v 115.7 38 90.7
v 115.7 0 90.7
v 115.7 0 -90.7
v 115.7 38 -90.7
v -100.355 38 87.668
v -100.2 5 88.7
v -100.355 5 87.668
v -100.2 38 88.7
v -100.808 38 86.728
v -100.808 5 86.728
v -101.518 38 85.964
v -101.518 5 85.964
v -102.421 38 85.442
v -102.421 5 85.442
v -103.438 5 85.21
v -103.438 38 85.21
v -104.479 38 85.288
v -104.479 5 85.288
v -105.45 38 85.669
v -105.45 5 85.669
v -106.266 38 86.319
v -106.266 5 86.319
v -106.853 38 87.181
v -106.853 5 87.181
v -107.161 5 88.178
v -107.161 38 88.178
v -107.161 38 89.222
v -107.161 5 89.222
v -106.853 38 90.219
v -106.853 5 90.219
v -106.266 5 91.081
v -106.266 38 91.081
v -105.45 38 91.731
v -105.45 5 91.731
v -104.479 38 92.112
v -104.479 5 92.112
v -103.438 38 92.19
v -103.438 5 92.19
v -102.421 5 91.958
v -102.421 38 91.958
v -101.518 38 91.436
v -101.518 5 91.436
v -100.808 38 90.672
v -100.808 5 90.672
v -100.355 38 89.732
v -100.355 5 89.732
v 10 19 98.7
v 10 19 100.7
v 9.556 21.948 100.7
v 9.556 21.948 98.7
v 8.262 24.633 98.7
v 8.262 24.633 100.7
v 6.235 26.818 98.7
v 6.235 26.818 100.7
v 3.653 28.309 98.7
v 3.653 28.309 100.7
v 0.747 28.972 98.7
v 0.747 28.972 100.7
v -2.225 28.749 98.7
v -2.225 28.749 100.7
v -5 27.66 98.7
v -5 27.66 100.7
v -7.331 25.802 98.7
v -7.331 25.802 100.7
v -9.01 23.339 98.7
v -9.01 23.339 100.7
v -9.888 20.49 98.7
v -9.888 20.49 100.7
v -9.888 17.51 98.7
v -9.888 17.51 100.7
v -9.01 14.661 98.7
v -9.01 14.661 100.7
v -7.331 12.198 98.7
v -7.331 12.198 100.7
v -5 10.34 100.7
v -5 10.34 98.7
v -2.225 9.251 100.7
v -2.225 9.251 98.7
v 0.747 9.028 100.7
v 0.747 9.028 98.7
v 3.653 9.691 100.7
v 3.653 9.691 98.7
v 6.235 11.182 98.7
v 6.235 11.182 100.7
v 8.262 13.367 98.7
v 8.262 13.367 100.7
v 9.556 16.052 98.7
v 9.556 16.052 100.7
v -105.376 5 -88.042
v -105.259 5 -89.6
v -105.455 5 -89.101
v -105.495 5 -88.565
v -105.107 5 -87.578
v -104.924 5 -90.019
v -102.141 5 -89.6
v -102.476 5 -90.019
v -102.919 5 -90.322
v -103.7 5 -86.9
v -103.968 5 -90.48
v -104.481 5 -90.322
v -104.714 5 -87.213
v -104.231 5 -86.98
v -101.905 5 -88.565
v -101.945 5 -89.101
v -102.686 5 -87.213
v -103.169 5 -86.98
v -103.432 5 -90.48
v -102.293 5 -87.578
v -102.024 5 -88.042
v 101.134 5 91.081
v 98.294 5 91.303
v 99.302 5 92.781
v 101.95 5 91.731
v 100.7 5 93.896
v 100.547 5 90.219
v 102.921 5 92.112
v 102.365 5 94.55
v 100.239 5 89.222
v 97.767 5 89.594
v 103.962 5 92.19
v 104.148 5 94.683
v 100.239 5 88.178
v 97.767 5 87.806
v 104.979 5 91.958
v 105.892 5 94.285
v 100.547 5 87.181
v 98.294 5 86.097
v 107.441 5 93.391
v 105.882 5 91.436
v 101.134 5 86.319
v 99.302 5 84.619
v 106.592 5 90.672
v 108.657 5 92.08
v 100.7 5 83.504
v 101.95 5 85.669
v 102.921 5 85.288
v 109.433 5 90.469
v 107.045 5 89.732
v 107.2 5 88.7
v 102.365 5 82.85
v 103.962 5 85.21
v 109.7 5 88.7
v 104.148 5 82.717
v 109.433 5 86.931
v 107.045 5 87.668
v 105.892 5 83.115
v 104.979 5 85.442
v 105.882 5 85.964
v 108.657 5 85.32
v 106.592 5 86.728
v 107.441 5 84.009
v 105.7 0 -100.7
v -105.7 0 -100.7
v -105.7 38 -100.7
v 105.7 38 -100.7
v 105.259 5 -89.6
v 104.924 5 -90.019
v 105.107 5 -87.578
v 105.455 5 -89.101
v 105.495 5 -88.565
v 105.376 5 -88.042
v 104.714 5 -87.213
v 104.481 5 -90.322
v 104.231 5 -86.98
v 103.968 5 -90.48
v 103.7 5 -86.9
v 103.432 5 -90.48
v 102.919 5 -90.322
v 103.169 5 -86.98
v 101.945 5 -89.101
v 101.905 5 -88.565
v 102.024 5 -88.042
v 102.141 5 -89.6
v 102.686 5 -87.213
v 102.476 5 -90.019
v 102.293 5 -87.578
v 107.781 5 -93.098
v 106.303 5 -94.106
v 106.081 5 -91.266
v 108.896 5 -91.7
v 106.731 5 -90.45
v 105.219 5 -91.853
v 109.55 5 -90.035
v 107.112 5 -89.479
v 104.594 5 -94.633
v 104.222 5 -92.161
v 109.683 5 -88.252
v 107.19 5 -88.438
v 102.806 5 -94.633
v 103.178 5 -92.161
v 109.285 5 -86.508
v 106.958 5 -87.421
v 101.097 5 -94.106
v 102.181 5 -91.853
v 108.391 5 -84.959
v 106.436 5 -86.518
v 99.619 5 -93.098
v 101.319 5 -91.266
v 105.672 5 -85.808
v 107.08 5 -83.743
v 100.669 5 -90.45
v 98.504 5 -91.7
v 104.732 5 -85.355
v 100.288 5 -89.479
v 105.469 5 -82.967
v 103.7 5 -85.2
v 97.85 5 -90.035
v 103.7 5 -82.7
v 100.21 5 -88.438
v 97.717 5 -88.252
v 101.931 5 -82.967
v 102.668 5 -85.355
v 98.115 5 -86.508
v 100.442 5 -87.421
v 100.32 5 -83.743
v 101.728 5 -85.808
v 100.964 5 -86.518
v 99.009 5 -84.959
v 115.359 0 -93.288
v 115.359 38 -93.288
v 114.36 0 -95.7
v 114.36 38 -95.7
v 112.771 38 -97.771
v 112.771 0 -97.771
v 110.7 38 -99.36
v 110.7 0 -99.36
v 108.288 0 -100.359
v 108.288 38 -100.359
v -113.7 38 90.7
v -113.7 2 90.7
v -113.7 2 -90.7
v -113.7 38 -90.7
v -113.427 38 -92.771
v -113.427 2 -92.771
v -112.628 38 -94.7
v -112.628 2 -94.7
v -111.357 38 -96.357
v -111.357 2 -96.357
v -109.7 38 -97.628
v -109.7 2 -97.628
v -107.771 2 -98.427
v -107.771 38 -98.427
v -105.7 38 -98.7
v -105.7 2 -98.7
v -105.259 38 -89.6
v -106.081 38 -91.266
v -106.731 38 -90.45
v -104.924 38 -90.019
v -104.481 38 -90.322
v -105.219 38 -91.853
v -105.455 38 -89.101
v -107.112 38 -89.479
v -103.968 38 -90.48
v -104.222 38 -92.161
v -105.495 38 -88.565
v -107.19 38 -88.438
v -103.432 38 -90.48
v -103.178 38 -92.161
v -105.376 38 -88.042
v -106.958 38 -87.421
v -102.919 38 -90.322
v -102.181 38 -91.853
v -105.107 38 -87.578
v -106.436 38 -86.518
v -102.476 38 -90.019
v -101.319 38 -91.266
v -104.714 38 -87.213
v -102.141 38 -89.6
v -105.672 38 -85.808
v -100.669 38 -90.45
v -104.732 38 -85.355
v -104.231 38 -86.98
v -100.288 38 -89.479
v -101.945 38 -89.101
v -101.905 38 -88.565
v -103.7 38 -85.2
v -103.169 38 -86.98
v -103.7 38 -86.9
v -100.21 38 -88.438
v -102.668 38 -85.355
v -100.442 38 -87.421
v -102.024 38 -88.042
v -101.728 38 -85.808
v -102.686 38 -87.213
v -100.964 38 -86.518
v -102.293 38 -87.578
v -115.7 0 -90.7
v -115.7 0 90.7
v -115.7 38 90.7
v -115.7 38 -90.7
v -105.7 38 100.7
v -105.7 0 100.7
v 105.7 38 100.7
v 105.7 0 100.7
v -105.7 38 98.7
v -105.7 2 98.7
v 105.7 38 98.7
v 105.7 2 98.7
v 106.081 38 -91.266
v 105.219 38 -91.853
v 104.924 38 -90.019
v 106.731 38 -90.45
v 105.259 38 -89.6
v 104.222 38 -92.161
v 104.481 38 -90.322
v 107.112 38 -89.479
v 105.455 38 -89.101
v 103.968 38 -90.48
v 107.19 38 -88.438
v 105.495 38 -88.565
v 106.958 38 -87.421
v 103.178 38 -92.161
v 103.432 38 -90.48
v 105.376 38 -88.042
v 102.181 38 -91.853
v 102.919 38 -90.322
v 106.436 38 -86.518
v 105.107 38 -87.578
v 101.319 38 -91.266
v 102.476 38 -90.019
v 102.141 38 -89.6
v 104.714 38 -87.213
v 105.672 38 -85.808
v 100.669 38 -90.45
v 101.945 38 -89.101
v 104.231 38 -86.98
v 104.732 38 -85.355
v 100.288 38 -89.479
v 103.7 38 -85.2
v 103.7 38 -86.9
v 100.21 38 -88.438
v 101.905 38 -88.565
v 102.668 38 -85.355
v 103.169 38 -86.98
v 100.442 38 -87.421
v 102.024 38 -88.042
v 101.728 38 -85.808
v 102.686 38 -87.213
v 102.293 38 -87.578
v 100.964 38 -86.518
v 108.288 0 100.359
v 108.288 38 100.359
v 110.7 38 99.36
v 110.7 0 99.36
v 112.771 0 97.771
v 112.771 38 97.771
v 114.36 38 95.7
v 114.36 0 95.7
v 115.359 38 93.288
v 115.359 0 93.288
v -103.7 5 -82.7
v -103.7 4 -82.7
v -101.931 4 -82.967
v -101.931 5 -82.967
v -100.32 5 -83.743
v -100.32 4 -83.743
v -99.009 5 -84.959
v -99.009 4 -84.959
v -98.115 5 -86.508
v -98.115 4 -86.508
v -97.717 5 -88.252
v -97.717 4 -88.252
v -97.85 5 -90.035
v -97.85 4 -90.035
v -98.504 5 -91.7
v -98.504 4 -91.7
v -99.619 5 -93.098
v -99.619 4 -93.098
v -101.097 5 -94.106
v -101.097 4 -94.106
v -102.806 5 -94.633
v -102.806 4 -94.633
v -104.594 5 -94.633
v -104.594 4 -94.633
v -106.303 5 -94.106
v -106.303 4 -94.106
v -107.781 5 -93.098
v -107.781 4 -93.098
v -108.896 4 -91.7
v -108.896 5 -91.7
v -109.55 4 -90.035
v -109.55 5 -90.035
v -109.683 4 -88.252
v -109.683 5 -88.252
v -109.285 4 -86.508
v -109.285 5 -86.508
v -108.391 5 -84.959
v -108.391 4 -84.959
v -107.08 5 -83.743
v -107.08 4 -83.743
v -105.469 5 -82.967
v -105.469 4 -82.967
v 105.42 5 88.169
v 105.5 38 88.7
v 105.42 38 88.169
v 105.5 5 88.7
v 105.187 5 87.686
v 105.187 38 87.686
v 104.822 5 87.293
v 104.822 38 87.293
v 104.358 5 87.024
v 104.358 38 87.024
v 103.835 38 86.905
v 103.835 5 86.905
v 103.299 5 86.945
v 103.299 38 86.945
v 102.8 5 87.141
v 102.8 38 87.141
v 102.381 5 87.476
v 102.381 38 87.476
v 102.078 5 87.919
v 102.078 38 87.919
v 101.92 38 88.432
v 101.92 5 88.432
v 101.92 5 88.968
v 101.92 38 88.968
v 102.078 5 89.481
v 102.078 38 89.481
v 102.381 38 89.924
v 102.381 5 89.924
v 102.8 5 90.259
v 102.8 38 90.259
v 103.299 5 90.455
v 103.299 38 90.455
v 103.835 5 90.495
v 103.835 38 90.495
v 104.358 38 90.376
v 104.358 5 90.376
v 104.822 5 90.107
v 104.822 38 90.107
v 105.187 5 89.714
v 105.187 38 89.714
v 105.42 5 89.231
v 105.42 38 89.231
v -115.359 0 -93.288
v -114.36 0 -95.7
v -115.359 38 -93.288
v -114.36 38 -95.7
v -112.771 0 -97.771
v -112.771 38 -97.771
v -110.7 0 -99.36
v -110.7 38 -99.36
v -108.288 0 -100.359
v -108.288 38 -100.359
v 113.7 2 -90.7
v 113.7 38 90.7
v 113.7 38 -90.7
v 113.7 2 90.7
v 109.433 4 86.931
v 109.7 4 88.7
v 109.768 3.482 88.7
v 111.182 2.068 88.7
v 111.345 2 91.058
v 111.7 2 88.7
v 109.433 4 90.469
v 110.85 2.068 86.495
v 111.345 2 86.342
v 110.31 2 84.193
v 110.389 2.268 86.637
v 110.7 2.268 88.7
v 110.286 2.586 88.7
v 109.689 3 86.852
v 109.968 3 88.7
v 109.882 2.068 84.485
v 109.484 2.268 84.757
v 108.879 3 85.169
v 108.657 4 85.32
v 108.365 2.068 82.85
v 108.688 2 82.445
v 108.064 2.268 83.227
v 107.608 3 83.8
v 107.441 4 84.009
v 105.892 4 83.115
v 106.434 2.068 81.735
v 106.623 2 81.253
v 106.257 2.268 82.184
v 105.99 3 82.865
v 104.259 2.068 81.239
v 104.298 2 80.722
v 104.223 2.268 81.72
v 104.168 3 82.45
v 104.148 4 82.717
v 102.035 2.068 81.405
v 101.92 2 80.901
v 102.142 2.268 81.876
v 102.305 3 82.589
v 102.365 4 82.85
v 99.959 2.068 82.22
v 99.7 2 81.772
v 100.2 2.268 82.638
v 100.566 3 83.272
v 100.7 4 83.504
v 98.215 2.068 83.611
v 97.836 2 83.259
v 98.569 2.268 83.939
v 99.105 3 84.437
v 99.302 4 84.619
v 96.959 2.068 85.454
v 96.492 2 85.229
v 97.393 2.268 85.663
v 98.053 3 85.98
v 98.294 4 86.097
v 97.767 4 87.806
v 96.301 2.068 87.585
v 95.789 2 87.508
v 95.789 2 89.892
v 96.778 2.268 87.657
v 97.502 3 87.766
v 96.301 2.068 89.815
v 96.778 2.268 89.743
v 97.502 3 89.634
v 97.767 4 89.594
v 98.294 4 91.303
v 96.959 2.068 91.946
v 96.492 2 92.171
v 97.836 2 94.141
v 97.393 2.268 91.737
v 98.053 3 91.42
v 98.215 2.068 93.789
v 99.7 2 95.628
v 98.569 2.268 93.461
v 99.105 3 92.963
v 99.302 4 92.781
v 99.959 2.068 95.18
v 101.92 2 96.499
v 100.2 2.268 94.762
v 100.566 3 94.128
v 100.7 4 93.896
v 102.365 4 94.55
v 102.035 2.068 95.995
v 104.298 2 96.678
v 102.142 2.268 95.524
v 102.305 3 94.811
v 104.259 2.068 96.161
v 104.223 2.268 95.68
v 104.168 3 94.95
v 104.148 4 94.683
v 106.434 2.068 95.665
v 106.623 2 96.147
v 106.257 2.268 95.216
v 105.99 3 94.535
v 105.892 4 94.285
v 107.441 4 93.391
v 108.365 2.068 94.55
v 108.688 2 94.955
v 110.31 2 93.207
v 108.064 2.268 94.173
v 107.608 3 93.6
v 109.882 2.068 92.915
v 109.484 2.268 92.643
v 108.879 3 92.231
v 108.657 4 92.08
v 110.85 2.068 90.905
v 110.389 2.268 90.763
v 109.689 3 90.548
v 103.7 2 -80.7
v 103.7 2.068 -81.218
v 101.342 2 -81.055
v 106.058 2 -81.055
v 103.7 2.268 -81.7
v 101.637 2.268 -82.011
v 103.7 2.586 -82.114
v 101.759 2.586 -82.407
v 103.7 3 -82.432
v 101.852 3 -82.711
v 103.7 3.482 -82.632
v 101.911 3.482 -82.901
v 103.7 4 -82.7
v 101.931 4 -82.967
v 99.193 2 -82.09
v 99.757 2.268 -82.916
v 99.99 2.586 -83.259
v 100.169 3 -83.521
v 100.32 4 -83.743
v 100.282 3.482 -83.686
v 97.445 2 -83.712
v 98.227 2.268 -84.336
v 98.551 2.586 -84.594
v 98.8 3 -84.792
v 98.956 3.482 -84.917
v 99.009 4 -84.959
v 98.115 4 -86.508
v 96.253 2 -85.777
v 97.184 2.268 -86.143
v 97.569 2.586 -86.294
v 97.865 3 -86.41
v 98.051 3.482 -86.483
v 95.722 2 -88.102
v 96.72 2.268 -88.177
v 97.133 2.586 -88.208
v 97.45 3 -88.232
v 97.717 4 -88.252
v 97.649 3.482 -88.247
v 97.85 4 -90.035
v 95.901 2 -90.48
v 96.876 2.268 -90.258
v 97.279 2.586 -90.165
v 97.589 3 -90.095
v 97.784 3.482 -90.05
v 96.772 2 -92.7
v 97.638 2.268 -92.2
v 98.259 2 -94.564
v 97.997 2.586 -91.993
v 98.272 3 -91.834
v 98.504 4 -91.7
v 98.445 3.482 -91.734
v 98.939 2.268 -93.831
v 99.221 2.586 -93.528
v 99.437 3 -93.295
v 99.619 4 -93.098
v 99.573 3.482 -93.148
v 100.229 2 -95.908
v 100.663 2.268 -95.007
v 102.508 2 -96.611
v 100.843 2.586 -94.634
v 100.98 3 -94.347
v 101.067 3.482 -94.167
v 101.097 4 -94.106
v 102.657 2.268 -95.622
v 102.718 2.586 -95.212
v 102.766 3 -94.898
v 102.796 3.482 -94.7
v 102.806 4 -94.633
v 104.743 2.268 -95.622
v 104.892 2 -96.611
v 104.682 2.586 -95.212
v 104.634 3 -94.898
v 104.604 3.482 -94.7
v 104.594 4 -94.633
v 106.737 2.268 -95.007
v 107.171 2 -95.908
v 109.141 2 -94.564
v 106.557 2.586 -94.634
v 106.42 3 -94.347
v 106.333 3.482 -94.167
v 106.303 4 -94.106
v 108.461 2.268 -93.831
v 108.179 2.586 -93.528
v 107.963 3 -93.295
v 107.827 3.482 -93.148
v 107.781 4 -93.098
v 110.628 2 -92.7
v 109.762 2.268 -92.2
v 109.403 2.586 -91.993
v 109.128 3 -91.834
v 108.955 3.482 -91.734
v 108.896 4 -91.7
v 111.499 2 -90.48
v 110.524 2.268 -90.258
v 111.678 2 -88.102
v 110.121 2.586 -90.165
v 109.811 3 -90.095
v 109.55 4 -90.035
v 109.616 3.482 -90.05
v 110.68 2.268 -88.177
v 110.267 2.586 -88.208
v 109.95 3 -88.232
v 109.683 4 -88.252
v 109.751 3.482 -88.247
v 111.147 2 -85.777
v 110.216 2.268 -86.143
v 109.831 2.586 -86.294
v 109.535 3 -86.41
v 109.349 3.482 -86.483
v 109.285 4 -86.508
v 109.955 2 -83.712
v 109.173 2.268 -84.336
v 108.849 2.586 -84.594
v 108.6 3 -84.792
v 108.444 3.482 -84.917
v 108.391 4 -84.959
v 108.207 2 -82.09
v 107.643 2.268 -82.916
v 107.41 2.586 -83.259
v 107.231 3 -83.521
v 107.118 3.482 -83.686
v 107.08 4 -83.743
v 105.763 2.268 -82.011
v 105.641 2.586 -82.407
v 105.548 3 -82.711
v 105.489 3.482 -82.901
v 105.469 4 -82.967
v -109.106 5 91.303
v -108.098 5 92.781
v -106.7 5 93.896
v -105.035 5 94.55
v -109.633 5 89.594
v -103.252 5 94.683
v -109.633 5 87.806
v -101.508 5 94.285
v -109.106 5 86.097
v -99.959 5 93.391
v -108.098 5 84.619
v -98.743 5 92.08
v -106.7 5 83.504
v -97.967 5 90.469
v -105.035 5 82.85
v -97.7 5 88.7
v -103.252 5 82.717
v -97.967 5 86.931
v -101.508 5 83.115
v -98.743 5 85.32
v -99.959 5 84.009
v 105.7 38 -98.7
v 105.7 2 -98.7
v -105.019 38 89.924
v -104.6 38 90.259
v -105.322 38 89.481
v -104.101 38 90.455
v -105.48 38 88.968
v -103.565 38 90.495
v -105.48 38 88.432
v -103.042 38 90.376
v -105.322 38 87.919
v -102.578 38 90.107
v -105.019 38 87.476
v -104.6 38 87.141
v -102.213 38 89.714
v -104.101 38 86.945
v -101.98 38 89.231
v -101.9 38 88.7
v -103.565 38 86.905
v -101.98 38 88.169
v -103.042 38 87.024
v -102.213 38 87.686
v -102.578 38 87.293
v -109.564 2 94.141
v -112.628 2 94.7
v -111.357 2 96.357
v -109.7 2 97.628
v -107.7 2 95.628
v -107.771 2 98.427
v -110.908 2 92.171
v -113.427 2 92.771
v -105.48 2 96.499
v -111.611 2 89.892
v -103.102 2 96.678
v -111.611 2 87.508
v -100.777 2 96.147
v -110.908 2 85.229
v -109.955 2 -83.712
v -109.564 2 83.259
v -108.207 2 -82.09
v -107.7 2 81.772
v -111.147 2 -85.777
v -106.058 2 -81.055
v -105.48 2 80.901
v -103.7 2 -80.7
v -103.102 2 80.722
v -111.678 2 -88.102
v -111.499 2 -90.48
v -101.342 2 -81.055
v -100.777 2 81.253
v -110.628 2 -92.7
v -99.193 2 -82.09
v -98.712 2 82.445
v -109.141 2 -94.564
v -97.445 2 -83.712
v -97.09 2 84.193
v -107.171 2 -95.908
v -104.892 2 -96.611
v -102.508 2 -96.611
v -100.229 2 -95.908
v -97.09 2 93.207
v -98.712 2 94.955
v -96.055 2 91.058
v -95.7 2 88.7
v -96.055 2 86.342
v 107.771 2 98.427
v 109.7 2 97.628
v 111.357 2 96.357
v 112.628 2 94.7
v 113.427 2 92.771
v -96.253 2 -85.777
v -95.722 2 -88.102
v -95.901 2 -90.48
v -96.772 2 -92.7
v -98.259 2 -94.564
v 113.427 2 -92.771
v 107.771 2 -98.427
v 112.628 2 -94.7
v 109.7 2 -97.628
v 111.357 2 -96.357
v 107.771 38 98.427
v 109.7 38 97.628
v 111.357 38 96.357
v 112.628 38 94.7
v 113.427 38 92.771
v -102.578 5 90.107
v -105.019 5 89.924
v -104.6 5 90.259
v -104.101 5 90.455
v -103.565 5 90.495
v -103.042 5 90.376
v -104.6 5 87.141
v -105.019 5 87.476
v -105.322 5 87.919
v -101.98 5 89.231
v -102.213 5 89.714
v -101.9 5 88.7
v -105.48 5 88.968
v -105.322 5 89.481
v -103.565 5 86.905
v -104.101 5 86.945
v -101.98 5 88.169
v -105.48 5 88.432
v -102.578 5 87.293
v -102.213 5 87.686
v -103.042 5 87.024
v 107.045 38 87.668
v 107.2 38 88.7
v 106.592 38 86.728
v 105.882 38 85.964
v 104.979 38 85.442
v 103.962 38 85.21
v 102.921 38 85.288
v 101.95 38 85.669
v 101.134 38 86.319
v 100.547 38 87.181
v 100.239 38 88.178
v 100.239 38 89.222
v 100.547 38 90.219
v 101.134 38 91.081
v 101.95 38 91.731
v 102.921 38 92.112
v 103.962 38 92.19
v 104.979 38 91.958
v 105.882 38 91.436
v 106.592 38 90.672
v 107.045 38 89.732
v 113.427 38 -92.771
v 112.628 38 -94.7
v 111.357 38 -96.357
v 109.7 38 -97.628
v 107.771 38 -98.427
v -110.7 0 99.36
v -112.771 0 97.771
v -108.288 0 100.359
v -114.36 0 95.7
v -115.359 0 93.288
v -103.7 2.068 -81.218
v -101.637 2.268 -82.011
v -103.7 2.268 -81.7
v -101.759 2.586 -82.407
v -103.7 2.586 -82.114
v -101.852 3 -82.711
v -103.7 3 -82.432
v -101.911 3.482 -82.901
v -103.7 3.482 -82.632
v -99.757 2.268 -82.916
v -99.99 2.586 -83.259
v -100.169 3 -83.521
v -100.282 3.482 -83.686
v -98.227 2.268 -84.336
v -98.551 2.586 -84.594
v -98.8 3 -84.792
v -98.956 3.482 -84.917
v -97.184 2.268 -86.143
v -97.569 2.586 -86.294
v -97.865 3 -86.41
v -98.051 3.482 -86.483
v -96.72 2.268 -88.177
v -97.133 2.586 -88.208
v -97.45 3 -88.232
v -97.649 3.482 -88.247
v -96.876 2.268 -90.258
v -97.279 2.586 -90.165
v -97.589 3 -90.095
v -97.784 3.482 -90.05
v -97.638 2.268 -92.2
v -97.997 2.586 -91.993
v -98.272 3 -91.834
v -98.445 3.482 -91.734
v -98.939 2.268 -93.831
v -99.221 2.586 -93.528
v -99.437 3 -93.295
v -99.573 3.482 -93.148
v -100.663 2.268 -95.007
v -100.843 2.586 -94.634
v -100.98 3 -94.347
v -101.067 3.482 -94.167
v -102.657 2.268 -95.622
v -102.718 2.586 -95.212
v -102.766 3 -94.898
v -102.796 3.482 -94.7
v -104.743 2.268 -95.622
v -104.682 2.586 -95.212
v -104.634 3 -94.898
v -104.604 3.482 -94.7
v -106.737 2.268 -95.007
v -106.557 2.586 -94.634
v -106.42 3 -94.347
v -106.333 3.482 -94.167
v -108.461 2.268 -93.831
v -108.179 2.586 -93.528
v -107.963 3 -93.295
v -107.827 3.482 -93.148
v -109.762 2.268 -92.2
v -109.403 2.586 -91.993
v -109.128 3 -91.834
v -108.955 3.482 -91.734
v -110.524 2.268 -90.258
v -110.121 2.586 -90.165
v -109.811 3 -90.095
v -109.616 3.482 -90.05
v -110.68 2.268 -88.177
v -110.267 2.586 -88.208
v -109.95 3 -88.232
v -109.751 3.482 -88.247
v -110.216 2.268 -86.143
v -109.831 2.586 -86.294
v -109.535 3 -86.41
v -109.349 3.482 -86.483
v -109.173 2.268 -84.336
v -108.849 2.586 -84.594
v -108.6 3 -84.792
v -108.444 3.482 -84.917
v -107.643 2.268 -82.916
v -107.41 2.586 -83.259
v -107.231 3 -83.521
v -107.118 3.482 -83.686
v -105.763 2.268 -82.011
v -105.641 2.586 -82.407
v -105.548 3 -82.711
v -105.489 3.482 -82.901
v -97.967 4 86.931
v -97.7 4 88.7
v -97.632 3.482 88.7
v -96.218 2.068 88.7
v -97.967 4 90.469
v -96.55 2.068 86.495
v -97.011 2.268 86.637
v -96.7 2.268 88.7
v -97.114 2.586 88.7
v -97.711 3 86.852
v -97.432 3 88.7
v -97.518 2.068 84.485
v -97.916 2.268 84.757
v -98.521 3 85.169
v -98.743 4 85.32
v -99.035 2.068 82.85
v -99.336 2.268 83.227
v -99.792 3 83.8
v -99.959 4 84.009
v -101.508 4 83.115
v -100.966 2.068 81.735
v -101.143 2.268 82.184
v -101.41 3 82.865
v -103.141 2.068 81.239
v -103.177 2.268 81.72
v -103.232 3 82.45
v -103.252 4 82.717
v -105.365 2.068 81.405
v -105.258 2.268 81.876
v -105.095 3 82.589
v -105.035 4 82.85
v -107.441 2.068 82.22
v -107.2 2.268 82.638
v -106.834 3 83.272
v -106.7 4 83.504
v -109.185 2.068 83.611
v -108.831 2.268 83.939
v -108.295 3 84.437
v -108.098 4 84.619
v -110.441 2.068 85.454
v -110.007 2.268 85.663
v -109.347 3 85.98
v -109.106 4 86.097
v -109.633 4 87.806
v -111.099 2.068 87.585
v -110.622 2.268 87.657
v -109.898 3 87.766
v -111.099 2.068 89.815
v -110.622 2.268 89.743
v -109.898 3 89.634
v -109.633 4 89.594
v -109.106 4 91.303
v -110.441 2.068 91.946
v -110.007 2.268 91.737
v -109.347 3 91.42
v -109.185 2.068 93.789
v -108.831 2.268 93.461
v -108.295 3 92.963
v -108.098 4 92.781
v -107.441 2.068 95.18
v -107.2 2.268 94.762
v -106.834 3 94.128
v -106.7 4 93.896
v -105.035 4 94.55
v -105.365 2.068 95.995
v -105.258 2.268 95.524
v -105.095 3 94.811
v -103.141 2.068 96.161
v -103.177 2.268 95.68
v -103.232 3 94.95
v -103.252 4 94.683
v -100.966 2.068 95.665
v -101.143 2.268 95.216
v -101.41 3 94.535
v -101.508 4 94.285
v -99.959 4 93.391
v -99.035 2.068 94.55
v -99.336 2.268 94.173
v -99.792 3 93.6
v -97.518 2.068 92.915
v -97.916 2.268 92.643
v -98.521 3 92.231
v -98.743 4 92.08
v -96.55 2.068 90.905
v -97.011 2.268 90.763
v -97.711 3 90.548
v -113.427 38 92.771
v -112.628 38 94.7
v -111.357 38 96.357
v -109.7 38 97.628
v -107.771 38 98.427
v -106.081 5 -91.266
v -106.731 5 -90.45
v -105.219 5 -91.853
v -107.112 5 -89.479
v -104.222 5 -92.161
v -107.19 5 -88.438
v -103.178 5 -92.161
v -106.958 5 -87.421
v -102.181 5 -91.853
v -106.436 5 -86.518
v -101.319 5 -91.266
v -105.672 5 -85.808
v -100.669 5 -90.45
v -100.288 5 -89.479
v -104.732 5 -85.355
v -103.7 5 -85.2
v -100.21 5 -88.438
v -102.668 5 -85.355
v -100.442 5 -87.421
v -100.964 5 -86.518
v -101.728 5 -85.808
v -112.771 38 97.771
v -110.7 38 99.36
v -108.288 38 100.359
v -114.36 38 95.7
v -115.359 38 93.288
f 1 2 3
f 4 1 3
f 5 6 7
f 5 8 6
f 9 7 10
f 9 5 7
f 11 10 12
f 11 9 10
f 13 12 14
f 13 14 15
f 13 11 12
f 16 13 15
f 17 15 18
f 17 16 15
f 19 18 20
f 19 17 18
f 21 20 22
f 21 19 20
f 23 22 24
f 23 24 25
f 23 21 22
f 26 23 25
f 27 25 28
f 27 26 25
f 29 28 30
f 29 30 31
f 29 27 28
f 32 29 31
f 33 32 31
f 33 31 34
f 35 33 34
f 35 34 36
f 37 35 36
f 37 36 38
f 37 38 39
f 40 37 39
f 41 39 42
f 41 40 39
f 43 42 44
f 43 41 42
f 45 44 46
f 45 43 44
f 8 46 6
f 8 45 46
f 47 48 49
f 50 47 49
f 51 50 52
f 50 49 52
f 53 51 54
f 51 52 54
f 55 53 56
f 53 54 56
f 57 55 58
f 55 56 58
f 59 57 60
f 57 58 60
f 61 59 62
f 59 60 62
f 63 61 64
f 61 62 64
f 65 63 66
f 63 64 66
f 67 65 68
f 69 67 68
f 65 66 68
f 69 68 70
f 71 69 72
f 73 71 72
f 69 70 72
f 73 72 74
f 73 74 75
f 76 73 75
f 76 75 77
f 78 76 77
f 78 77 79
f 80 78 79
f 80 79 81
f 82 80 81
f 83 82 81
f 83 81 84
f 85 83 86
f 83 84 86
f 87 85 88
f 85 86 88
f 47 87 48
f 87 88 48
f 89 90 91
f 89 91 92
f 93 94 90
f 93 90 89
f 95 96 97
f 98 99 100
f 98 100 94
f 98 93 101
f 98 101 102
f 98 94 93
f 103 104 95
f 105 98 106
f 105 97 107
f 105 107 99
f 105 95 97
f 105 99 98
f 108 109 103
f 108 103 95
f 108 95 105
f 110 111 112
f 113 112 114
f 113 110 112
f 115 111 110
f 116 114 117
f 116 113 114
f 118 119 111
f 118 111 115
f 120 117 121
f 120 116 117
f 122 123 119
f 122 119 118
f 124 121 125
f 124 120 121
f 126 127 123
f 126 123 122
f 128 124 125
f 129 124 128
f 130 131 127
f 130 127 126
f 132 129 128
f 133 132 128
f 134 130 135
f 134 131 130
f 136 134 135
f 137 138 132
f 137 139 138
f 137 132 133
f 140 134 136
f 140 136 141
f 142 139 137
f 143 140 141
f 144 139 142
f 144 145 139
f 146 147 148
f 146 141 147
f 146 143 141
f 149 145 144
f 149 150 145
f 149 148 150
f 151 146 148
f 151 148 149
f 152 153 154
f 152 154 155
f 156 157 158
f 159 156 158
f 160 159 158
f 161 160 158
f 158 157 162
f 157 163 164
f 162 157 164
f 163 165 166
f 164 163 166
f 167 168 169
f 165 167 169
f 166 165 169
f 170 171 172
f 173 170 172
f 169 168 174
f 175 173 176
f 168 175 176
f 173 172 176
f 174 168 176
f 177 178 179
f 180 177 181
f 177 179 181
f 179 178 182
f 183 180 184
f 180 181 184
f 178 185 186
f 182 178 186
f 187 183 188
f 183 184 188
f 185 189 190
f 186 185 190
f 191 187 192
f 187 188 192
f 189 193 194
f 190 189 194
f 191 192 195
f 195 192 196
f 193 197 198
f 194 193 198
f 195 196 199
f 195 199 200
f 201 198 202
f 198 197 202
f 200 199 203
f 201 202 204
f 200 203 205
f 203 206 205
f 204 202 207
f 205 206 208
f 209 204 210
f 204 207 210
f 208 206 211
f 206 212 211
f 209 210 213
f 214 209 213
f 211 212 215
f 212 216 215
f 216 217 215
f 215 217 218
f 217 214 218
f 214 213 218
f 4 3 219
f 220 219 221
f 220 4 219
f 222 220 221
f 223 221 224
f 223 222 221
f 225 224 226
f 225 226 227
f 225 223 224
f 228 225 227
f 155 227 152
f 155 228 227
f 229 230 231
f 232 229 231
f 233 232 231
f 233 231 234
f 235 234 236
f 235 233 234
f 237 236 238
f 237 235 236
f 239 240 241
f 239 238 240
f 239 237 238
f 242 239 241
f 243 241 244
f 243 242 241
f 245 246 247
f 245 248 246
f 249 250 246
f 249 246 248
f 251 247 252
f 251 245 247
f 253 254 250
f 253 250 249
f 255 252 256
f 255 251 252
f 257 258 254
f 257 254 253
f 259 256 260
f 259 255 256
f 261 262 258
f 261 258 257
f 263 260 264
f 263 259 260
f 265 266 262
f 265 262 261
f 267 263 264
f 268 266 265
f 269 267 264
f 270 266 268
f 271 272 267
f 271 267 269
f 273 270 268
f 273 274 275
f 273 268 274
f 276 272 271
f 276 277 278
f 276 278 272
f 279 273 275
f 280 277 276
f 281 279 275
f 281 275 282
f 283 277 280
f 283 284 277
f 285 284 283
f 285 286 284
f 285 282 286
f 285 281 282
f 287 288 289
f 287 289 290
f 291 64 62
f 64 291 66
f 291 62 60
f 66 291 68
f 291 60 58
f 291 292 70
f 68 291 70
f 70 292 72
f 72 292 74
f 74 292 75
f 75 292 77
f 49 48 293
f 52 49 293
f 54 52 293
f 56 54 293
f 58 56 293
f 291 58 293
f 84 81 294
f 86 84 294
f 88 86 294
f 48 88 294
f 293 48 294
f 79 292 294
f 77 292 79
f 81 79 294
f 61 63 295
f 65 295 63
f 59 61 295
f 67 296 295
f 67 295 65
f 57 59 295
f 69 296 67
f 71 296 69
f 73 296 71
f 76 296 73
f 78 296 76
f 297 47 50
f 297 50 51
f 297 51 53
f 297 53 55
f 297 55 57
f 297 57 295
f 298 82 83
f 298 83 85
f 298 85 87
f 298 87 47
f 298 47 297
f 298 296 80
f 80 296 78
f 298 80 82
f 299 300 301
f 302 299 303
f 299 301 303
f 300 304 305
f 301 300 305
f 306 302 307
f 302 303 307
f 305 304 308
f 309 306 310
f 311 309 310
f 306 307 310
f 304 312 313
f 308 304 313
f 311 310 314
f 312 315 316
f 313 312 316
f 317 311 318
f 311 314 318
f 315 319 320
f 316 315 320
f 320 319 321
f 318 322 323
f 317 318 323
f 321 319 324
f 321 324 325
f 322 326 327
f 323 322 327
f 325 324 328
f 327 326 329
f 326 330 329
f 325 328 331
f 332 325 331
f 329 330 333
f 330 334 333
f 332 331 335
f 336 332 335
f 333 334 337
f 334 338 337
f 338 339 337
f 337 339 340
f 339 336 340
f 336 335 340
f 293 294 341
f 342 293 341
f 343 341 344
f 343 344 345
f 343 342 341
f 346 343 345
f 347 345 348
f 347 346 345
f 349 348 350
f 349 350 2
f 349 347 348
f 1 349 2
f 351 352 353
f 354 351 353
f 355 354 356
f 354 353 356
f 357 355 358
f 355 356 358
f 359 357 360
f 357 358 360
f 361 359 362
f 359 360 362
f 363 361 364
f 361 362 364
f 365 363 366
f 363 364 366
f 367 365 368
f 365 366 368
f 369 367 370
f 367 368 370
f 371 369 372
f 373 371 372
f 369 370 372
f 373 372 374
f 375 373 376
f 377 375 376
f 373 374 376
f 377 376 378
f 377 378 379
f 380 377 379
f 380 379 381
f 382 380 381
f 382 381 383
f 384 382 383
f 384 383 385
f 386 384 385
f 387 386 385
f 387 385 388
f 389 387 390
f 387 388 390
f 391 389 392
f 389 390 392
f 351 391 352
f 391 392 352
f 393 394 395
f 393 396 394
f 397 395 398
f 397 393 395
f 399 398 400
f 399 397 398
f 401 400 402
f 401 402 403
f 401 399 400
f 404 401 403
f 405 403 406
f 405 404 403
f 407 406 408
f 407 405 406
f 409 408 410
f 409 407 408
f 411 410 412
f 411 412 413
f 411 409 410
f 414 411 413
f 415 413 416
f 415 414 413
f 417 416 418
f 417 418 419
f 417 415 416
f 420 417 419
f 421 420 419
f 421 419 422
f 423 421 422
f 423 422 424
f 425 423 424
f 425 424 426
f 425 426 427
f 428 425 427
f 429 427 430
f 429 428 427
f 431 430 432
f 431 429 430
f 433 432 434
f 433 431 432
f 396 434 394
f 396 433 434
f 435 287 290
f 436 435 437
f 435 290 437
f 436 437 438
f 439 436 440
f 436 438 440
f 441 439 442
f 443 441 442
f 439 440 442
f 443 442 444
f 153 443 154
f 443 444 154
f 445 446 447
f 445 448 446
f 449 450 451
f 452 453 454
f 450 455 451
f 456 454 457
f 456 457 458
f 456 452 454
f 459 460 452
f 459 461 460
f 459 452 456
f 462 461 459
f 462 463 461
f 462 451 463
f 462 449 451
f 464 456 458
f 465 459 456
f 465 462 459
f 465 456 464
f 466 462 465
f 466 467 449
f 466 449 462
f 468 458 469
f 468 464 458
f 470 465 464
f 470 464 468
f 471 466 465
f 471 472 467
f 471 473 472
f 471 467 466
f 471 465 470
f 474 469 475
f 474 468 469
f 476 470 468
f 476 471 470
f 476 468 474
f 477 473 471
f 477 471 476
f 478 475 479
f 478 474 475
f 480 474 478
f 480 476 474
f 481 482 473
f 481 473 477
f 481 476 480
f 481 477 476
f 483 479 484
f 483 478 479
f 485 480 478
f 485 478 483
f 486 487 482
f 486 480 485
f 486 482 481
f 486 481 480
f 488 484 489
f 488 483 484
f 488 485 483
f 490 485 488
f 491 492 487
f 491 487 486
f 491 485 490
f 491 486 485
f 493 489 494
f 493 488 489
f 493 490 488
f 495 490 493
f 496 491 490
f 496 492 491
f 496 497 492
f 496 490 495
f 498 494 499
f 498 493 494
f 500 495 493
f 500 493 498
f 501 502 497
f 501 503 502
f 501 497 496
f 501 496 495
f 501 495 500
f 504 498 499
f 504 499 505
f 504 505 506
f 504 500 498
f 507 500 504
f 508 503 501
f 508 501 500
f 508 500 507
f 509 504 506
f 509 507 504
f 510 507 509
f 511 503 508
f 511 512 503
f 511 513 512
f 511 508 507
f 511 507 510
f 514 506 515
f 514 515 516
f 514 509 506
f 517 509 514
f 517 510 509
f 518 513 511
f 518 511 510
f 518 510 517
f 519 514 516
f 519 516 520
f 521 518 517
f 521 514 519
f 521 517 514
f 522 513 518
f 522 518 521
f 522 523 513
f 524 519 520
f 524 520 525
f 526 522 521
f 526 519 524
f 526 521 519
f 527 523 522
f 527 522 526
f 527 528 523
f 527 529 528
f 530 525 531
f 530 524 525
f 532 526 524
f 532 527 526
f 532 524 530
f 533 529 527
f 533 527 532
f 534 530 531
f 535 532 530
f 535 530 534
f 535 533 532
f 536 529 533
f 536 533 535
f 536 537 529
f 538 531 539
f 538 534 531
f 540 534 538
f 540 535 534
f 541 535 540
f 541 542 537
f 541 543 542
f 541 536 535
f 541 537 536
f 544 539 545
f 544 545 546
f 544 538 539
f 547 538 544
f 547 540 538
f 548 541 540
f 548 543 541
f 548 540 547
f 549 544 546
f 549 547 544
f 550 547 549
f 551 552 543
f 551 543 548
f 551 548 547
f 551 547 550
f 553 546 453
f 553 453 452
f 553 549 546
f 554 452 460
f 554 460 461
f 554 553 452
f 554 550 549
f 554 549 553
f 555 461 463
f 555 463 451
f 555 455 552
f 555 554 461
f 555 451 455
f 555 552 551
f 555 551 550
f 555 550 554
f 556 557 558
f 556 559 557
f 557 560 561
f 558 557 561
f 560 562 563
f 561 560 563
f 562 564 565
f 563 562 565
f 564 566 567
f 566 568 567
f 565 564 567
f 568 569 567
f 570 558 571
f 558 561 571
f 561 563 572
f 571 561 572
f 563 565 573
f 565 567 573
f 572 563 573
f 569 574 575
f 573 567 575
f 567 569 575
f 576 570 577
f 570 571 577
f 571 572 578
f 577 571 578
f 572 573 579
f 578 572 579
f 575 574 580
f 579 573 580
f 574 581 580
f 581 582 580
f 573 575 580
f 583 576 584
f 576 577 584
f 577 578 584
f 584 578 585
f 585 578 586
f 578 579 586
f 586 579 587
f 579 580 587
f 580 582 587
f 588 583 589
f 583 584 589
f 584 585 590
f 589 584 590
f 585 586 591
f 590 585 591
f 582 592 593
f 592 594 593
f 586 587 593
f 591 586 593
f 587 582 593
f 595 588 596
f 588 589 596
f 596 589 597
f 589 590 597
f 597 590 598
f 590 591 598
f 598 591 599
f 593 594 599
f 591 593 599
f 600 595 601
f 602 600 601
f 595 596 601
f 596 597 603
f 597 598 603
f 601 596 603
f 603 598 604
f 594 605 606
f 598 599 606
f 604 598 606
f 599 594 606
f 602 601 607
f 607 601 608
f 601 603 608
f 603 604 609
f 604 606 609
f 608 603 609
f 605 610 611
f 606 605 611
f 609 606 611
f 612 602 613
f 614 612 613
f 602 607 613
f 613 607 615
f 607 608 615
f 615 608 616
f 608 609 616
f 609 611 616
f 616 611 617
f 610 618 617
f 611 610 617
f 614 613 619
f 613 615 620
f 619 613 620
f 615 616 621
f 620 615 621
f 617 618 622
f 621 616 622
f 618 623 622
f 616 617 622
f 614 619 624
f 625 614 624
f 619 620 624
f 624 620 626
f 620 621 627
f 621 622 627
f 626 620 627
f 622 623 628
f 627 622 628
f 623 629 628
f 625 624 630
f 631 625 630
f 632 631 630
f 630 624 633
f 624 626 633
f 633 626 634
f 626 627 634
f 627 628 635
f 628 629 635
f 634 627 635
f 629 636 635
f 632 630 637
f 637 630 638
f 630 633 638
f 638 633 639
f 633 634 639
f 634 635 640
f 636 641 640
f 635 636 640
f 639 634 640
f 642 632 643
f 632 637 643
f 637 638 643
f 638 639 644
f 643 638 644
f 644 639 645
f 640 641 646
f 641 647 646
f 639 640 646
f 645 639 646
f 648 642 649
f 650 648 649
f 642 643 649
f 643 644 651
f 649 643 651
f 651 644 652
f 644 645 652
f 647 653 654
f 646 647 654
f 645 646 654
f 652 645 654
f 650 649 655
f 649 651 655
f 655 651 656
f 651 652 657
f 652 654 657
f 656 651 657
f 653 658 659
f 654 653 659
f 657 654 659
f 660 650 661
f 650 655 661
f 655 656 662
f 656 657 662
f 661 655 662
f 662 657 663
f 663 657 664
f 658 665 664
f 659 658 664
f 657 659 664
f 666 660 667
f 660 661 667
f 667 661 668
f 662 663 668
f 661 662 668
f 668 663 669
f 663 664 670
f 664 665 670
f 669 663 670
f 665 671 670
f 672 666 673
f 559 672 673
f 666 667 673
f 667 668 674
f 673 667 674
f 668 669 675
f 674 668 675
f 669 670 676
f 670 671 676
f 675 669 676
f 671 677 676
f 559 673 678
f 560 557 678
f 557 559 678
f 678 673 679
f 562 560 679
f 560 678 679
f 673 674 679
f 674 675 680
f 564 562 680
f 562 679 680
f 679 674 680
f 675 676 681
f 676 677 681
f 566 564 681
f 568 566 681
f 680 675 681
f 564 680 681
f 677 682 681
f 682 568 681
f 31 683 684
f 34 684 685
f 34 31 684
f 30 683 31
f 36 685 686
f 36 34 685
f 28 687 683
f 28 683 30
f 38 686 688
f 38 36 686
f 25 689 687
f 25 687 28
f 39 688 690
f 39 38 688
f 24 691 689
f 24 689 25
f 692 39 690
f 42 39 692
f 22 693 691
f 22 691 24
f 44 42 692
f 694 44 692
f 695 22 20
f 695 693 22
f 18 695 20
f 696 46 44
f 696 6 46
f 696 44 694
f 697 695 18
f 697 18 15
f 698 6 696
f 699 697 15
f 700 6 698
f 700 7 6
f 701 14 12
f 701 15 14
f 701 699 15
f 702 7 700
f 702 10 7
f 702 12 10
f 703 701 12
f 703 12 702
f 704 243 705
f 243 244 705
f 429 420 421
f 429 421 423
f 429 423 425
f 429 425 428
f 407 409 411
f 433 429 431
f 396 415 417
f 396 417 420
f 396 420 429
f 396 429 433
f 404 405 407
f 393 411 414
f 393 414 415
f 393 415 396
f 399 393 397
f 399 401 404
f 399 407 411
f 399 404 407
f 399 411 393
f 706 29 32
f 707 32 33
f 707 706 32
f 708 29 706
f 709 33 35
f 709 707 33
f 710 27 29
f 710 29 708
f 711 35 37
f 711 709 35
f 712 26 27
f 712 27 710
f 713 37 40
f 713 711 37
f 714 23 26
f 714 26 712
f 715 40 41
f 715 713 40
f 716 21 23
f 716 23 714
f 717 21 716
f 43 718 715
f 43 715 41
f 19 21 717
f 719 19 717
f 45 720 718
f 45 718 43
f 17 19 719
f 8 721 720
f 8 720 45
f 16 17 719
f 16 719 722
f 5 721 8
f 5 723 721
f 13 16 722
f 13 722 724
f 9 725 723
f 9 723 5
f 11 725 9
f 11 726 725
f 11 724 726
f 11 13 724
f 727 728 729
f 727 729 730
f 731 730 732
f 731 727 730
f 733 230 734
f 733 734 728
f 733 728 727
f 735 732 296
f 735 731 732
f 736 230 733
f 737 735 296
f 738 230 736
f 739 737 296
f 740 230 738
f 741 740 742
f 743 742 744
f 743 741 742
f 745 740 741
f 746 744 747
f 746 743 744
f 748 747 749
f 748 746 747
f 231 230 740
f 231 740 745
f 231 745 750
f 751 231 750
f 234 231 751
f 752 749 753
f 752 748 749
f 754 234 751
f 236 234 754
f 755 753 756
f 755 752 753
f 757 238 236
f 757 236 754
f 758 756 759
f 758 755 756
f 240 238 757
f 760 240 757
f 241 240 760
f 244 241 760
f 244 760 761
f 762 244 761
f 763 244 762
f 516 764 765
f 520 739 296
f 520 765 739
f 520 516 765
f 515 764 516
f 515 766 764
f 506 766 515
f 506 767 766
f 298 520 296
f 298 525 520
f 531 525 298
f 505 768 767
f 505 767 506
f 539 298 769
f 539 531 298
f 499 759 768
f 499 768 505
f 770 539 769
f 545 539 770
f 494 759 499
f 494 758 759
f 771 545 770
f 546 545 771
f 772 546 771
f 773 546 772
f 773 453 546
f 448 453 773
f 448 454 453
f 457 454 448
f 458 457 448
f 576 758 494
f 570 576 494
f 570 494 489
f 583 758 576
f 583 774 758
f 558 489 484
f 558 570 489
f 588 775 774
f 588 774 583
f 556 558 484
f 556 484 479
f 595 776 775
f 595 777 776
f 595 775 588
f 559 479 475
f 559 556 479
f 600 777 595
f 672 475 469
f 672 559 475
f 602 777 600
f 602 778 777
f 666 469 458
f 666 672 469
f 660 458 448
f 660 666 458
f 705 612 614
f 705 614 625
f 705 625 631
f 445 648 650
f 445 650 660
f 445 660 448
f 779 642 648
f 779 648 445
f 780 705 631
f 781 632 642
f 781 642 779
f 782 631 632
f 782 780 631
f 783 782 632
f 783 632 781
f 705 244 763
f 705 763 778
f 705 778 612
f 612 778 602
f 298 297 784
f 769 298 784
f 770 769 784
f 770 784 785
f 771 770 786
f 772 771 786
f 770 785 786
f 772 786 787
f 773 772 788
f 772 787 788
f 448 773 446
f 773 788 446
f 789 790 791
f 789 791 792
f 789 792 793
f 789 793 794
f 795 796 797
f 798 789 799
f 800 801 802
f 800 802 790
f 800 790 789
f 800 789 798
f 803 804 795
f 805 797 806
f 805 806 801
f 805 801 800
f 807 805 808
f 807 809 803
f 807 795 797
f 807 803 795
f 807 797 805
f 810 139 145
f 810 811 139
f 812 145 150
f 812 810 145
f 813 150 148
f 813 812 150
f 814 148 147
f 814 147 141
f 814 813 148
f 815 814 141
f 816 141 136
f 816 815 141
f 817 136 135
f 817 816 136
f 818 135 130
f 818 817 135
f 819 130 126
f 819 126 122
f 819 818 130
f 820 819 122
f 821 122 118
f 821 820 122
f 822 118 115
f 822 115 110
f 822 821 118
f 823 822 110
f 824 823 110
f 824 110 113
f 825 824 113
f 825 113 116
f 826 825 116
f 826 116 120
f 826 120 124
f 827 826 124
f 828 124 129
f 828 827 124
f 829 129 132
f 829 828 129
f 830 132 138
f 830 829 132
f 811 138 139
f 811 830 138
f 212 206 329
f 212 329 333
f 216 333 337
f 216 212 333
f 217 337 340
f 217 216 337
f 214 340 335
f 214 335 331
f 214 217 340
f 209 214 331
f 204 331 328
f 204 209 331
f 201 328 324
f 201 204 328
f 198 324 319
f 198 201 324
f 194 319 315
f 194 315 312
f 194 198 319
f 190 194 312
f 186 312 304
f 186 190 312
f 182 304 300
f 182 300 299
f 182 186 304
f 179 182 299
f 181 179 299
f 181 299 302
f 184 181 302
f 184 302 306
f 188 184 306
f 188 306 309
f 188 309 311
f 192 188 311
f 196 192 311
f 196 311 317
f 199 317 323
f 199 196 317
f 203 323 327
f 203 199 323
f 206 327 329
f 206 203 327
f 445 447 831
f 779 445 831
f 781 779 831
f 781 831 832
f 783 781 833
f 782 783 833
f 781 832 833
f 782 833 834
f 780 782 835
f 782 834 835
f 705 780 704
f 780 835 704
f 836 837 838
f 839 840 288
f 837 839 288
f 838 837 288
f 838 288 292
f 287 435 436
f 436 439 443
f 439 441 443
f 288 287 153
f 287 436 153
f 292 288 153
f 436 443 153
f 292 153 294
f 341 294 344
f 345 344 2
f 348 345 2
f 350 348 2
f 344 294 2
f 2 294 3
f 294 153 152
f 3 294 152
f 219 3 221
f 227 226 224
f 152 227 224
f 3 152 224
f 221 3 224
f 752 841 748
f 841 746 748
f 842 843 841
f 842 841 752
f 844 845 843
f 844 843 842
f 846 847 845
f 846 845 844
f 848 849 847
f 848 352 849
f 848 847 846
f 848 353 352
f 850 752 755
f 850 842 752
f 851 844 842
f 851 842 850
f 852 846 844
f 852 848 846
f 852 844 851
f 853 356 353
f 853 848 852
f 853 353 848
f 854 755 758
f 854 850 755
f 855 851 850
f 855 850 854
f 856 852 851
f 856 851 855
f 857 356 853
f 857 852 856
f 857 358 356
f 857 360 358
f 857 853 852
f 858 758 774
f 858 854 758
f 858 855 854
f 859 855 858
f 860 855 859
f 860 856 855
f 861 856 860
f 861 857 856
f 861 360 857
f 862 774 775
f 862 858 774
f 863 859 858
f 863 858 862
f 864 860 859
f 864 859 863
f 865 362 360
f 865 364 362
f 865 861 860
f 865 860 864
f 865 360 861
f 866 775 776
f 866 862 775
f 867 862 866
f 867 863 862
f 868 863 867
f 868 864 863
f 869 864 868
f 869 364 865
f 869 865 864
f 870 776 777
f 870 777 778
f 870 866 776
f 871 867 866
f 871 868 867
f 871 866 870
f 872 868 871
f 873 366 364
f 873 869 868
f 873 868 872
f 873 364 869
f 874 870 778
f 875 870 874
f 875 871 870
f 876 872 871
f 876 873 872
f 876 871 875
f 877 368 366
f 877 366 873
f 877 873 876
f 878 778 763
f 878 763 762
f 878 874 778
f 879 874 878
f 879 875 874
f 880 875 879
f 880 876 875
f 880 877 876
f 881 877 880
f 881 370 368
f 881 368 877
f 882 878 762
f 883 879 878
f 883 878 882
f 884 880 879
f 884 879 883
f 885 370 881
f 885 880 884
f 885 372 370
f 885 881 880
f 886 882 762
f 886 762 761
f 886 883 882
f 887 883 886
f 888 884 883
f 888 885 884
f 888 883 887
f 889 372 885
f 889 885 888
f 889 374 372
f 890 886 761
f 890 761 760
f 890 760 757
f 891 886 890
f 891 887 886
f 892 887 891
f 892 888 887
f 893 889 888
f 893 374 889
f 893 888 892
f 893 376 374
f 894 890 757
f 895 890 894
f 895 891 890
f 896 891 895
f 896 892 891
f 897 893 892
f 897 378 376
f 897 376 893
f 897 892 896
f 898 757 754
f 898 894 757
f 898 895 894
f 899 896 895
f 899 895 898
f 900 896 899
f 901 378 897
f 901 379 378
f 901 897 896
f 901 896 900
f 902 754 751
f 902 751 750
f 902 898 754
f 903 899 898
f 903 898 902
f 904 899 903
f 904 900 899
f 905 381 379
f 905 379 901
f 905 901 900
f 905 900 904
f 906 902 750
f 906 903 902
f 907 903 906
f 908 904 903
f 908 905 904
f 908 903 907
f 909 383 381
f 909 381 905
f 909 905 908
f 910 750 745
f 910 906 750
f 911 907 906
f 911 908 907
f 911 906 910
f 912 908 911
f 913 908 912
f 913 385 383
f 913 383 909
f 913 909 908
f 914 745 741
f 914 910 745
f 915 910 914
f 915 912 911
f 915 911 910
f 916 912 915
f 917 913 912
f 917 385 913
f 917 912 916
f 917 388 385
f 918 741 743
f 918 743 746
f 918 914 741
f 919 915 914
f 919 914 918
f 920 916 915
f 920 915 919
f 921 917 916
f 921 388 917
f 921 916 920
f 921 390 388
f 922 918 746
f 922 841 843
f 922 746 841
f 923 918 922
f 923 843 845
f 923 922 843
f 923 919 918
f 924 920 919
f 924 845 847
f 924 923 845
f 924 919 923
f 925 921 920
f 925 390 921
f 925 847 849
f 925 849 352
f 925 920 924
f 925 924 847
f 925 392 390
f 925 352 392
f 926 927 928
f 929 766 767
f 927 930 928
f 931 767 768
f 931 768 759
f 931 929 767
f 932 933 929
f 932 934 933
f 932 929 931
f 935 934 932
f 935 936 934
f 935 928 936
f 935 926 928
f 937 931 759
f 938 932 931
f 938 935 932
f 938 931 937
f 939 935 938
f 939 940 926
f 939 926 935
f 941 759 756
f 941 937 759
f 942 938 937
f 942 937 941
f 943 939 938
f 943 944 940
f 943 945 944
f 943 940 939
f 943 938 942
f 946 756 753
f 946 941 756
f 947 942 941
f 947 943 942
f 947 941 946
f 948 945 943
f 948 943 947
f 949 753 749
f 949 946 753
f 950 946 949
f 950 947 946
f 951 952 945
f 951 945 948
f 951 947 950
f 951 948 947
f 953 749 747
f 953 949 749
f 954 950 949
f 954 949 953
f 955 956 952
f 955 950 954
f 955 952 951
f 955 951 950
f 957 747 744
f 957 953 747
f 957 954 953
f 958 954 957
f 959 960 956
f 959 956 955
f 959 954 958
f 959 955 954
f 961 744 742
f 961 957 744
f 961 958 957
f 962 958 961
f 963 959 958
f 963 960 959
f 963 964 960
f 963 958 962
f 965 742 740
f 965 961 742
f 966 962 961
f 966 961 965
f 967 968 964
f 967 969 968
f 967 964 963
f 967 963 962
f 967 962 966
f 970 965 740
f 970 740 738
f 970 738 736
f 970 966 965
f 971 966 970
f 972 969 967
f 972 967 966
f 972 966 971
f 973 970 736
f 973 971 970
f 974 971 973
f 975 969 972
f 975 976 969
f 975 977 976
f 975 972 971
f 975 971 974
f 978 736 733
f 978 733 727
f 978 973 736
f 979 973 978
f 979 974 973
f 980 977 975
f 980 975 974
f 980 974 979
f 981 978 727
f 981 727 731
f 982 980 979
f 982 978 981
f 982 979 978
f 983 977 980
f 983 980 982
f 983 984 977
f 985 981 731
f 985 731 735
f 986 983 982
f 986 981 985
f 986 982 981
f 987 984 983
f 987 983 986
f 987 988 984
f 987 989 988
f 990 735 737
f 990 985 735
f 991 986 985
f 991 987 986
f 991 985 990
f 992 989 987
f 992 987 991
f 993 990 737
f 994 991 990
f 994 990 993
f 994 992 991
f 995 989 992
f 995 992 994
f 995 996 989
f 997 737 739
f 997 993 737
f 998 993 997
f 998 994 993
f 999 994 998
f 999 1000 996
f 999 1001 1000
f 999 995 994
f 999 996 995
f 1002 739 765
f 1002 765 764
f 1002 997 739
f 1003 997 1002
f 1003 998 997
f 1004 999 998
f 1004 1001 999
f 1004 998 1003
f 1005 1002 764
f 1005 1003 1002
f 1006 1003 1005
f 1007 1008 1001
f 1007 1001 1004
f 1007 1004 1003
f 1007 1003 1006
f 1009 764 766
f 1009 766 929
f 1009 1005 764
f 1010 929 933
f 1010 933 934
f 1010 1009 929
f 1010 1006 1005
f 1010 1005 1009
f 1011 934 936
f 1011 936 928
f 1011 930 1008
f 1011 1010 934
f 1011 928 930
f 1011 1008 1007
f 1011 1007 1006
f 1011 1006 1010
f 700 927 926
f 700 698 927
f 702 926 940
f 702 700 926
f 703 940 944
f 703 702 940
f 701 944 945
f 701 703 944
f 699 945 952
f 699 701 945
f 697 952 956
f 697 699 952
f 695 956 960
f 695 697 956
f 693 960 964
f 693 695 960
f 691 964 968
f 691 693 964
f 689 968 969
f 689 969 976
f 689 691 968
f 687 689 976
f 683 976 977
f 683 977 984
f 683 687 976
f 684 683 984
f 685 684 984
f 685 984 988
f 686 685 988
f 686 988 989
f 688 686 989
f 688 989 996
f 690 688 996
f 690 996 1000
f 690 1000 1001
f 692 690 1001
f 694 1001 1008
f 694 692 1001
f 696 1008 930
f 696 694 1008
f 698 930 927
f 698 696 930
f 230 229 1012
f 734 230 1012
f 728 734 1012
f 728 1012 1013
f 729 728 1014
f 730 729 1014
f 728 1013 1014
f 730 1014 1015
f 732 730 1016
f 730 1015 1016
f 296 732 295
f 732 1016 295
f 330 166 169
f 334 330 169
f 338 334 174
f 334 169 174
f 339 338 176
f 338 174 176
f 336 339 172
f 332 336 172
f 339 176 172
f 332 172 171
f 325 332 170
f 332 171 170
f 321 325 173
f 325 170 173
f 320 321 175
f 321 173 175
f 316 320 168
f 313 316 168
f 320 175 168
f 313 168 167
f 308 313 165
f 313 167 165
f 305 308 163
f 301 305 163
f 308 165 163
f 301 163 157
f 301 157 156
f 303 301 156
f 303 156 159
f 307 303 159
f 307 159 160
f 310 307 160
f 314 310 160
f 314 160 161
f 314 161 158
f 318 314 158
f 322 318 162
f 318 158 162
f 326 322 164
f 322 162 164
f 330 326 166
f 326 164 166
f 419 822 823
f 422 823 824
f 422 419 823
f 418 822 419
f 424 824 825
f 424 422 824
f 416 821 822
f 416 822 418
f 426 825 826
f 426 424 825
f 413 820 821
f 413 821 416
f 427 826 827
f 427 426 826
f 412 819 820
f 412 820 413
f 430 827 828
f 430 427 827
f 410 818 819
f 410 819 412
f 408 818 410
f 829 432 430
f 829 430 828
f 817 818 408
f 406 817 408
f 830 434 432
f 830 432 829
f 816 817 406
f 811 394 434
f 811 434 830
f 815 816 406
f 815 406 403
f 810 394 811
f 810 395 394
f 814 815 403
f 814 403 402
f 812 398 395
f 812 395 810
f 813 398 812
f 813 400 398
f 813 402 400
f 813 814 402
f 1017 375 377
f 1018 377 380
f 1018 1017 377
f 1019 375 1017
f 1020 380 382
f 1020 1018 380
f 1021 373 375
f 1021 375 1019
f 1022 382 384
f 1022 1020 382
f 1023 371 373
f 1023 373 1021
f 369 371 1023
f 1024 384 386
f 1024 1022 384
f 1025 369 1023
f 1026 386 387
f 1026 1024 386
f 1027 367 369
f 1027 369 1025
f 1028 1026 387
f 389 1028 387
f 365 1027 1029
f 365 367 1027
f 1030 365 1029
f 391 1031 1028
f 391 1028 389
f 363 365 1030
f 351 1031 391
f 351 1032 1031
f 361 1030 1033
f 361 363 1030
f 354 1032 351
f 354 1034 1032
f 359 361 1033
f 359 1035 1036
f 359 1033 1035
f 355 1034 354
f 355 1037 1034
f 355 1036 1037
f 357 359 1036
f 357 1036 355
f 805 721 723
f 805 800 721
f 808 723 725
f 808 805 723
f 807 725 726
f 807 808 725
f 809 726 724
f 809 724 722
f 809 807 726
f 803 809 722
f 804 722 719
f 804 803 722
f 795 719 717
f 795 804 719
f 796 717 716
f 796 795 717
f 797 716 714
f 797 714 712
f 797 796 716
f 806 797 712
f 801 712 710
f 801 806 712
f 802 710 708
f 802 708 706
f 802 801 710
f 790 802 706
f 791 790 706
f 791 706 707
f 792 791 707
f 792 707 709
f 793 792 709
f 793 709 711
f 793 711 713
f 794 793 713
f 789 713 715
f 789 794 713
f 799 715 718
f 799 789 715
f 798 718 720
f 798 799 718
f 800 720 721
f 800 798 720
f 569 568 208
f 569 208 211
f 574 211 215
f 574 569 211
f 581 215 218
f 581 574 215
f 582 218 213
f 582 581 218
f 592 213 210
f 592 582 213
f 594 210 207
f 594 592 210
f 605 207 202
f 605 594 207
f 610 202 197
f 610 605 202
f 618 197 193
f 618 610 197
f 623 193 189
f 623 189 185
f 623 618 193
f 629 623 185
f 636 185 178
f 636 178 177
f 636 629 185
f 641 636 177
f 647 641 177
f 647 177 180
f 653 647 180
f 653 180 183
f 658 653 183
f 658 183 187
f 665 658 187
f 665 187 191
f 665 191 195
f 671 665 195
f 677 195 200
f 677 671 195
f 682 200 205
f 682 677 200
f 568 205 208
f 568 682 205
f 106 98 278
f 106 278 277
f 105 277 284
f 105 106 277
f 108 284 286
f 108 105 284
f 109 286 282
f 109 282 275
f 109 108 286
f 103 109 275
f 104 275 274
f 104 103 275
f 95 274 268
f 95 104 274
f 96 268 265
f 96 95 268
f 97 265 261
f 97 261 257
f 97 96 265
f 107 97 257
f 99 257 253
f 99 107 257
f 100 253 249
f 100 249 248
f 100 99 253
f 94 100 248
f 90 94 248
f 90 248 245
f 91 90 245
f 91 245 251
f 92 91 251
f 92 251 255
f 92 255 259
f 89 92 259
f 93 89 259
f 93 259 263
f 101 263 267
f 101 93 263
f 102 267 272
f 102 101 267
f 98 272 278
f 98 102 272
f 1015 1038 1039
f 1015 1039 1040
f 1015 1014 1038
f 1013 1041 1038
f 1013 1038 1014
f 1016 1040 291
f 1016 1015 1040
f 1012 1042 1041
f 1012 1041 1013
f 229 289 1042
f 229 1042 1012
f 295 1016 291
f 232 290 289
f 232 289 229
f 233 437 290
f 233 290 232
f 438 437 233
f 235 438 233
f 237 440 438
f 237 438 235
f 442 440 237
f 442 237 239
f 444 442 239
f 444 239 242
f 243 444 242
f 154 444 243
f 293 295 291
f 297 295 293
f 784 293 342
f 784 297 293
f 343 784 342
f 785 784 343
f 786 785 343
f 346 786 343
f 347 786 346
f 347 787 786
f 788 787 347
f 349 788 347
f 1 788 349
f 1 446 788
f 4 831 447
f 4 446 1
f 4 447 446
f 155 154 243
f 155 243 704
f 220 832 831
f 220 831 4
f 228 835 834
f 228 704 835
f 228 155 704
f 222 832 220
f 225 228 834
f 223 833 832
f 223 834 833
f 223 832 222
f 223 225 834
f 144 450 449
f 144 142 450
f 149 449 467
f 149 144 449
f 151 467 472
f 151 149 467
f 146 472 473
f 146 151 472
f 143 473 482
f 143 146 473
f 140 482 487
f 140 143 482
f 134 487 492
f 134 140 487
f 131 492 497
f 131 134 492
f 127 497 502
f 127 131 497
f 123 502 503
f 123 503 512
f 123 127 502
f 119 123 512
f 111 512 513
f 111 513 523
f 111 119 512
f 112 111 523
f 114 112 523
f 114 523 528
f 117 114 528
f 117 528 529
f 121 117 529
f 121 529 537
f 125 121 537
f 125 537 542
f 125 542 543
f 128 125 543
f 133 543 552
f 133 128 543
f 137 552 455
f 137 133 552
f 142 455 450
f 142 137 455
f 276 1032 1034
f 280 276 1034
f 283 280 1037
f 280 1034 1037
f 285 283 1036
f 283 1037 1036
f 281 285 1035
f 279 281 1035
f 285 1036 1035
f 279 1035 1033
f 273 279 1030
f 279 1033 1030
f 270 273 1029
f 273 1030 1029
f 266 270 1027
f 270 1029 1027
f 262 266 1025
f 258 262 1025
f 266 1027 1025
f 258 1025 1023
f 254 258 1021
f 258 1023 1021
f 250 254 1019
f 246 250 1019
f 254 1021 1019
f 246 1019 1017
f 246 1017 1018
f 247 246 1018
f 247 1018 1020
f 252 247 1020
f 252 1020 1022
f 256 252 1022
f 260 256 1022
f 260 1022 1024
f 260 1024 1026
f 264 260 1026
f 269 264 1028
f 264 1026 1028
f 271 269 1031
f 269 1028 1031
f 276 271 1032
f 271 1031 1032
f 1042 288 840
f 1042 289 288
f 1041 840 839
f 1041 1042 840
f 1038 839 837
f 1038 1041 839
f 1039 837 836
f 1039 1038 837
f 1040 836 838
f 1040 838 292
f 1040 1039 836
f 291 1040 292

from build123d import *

# Parameters (mm, degrees)
SKETCH1_W            = 231.4
SKETCH1_H            = 201.4
BOSS_EXTRUDE1_DEPTH  = 38
FILLET1_R            = 10
SHELL1_T             = -2
SKETCH2_R            = 10
CUT_EXTRUDE1_DEPTH   = 2
SKETCH3_R            = 6
BOSS_EXTRUDE2_DEPTH  = 3
SKETCH4_R            = 3.5
SKETCH4_R_2          = 1.8
BOSS_EXTRUDE3_DEPTH  = 33
FILLET2_R            = 2
FILLET2_OF_MIRROR1_R = 2


# Read off the part's stored shape, not the designer's step: Mirror2
with BuildPart() as part:
    # Sketch1 → Boss-Extrude1 (new body)
    with BuildSketch(Plane(origin=(0, 0, 0), x_dir=(1, 0, 0), z_dir=(0, 1, 0))):
        Rectangle(SKETCH1_W, SKETCH1_H)
    extrude(amount=BOSS_EXTRUDE1_DEPTH)

    # Fillet1
    fillet1_edges = [part.edges().sort_by_distance(p)[0] for p in [
        (-115.7, 19, -100.7),
        (115.7, 19, -100.7),
        (115.7, 19, 100.7),
        (-115.7, 19, 100.7),
    ]]
    fillet(fillet1_edges, radius=FILLET1_R)

    # Shell1
    shell1_openings = [part.faces().sort_by_distance(p)[0] for p in [
        (0, 38, 0),
    ]]
    offset(amount=SHELL1_T, openings=shell1_openings, kind=Kind.INTERSECTION)

    # Sketch2 → Cut-Extrude1 (cut)
    with BuildSketch(Plane.XY.offset(100.7)):
        with Locations((0, 19)):
            Circle(SKETCH2_R)
    extrude(amount=-CUT_EXTRUDE1_DEPTH, mode=Mode.SUBTRACT)

    # Sketch3 → Boss-Extrude2 (add)
    with BuildSketch(Plane(origin=(0, 2, 0), x_dir=(1, 0, 0), z_dir=(0, 1, 0))):
        with Locations(Location((-103.7, 88.7, 0), (0, 0, 270))):
            Circle(SKETCH3_R)
    boss_extrude2 = extrude(amount=BOSS_EXTRUDE2_DEPTH)

    # Sketch4 → Boss-Extrude3 (add)
    with BuildSketch(Plane(origin=(0, 5, 0), x_dir=(1, 0, 0), z_dir=(0, 1, 0))):
        with Locations(Location((-103.7, 88.7, 0), (0, 0, 270))):
            Circle(SKETCH4_R)
        with Locations(Location((-103.7, 88.7, 0), (0, 0, 270))):
            Circle(SKETCH4_R_2, mode=Mode.SUBTRACT)
    boss_extrude3 = extrude(amount=BOSS_EXTRUDE3_DEPTH)

    # Fillet2
    fillet2_edges = [part.edges().sort_by_distance(p)[0] for p in [
        (-103.7, 2, -94.7),
    ]]
    fillet(fillet2_edges, radius=FILLET2_R)

    # Mirror1: Boss-Extrude2, Boss-Extrude3 across plane
    add(boss_extrude2.mirror(Plane(origin=(0, 0, 0), x_dir=(0, 0, 1), z_dir=(1, 0, 0))))
    add(boss_extrude3.mirror(Plane(origin=(0, 0, 0), x_dir=(0, 0, 1), z_dir=(1, 0, 0))))

    # Fillet2 of Mirror1
    fillet2_of_mirror1_edges = [part.edges().sort_by_distance(p)[0] for p in [
        (103.7, 2, -94.7),
    ]]
    fillet(fillet2_of_mirror1_edges, radius=FILLET2_OF_MIRROR1_R)

    # Mirror2 outline → Mirror2 (revolve)
    with BuildSketch(Plane(origin=(103.7, 0, 88.7), x_dir=(1, 0, 0), z_dir=(0, 0, 1))):
        with BuildLine():
            Line((3.5, 38), (1.8, 38))
            Line((1.8, 38), (1.8, 5))
            Line((1.8, 5), (0, 5))
            Line((0, 5), (0, 2))
            Line((0, 2), (8, 2))
            ThreePointArc((8, 2), (6.585786438, 2.585786438), (6, 4))
            Line((6, 4), (6, 5))
            Line((6, 5), (3.5, 5))
            Line((3.5, 5), (3.5, 38))
        make_face()
    revolve(axis=Axis((103.7, 0, 88.7), (0, 1, 0)))

    # Mirror2 2 outline → Mirror2 2 (revolve)
    with BuildSketch(Plane(origin=(-103.7, 0, 88.7), x_dir=(1, 0, 0), z_dir=(0, 0, 1))):
        with BuildLine():
            Line((3.5, 38), (1.8, 38))
            Line((1.8, 38), (1.8, 5))
            Line((1.8, 5), (0, 5))
            Line((0, 5), (0, 2))
            Line((0, 2), (8, 2))
            ThreePointArc((8, 2), (6.585786438, 2.585786438), (6, 4))
            Line((6, 4), (6, 5))
            Line((6, 5), (3.5, 5))
            Line((3.5, 5), (3.5, 38))
        make_face()
    revolve(axis=Axis((-103.7, 0, 88.7), (0, 1, 0)))


solid = part.part
